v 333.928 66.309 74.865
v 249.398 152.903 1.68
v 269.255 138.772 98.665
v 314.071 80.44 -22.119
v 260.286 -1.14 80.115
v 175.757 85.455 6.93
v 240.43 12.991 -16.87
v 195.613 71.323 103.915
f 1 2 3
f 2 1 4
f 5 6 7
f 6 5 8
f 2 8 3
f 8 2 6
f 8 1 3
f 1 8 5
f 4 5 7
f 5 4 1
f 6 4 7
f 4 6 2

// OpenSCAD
rotate([100,0,100]) 
translate([0,30,100]) 
rotate([33,0,100]) 
translate([0,0,100]) 
cube(100); 
//
//if you want to know where cube is mapped, or where any other point q will be 
//mapped, you just use the same transformation sequence in function syntax.   

q=[0,0,0]; 
q1 = 
rotate([100,0,100], 
translate([0,30,100], 
rotate([33,0,100], 
translate([0,0,100], q)))); 
echo(q1); 

//Here is my implementation of the three functions. The code looks more 
//difficult than it is, because the functions are part of a richer interface, 
//accept parameter calls without [] and work recursive. They operate over 
//points, lists of points, lists of lists of points and so on. I use them 
//mainly in connection with sweep(), but they will also serve your needs. 

function translate(x=0, y=0, z=0, v) = 
  let(v = (len(x)==3)?y:v, x = (len(x)==3)?x:[x, y, z]) 
  len(v[0])?[for (i=v) translate(x,i)]:v+x; 

function rotate(x=0, y=0, z=0, v) =  // 2D vectors allowed 
  let(v = (len(x)==3)?y:v, x=(len(x)==3)?x:[x, y, z]) 
  len(v[0])? [for(i=v) rotate(x,i)]:Rz(x[2], Ry(x[1], Rx(x[0], v)));   
function Rx(x, A) = len(A[0][0])?[for(i=A) Rx(x, i)]: 
    A*[[1, 0, 0], [0, cos(x), sin(x)], [0, -sin(x), cos(x)]]; 
function Ry(y, A) = len(A[0][0])?[for(i=A) Ry(y, i)]: 
    A*[[cos(y), 0, sin(y)], [0, 1, 0], [-sin(y), 0, cos(y)]]; 
function Rz(z, A) = len(A[0][0])? 
    [for(i=A) Rz(z, i)]: 
    len(A[0])==2? 
    A*[[cos(z), sin(z)], [-sin(z), cos(z)]]: 
    A*[[cos(z), sin(z), 0], [-sin(z), cos(z), 0], [0, 0, 1]]; 

function scale(x=1, y=1, z=1, v) = 
  let(v = (len(x)==3)?y:v, x = (len(x)==3)?x:[x, y, z]) 
  len(v[0])?[for (i=v) S_(x,i)]:[v[0]*x[0], v[1]*x[1], v[2]*x[2]]; 
